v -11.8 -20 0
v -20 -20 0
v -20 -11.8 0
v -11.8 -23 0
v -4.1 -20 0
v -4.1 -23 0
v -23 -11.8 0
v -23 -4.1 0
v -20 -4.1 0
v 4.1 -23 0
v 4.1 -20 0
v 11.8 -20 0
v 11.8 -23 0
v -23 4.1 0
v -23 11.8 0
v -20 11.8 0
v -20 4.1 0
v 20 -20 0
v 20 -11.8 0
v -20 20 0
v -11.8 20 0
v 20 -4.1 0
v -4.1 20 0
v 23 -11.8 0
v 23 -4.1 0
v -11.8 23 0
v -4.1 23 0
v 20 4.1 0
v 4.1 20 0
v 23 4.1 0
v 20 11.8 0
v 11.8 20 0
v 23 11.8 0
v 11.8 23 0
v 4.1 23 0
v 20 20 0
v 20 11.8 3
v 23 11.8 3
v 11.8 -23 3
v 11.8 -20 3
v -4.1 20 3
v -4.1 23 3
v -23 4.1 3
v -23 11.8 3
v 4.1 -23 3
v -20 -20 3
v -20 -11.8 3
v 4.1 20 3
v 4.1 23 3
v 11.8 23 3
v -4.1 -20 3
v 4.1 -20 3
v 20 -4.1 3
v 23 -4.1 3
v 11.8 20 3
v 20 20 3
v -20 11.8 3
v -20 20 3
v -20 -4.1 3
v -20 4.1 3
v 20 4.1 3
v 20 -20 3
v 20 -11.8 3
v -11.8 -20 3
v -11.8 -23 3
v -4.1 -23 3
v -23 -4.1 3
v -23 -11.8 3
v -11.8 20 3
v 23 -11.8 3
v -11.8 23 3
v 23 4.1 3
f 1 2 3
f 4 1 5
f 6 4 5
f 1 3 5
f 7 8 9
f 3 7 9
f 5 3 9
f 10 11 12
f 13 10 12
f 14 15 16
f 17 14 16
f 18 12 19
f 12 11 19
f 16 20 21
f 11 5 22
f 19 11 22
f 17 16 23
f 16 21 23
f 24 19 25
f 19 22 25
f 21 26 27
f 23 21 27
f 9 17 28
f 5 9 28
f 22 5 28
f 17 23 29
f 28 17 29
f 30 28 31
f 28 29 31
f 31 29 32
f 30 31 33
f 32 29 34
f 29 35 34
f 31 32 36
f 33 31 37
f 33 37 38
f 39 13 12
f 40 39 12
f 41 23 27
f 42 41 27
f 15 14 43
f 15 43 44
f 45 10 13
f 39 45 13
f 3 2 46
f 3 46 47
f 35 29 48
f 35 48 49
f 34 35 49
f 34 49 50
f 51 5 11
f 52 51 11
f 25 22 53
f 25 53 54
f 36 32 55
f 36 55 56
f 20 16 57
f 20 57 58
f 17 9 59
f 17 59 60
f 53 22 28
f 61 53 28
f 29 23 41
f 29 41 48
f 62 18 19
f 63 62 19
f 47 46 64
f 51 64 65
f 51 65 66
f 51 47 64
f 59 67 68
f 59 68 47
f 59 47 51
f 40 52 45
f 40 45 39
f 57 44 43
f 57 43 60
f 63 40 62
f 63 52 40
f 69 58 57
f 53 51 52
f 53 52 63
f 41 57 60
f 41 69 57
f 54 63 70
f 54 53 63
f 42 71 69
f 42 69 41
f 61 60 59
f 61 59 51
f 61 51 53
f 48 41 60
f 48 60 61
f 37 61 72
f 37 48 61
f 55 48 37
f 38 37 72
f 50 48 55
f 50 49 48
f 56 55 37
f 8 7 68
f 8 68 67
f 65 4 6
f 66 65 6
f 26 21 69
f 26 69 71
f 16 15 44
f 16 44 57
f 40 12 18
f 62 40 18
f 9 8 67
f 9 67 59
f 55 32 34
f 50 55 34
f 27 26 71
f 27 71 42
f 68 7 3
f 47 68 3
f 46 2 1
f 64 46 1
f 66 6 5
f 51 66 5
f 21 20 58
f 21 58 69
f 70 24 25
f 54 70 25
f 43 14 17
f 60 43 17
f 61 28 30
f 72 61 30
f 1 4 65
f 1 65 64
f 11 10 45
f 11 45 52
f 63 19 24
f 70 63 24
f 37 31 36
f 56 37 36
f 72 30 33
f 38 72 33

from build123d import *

# Parameters (mm, degrees)
CROQUIS1_W              = 3
CROQUIS1_H              = 7.7
CROQUIS1_W_2            = 7.7
CROQUIS1_H_2            = 3
CROQUIS1_W_3            = 40
CROQUIS1_H_3            = 40
SALIENTE_EXTRUIR1_DEPTH = 3


with BuildPart() as part:
    # Croquis1 → Saliente-Extruir1 (new body)
    with BuildSketch(Plane.XY):
        with Locations((-21.5, -7.95)):
            Rectangle(CROQUIS1_W, CROQUIS1_H)
        with Locations((-7.95, -21.5)):
            Rectangle(CROQUIS1_W_2, CROQUIS1_H_2)
        with Locations((7.95, -21.5)):
            Rectangle(CROQUIS1_W_2, CROQUIS1_H_2)
        with Locations((21.5, -7.95)):
            Rectangle(CROQUIS1_W, CROQUIS1_H)
        with Locations((21.5, 7.95)):
            Rectangle(CROQUIS1_W, CROQUIS1_H)
        with Locations((-21.5, 7.95)):
            Rectangle(CROQUIS1_W, CROQUIS1_H)
        with Locations((-7.95, 21.5)):
            Rectangle(CROQUIS1_W_2, CROQUIS1_H_2)
        with Locations((7.95, 21.5)):
            Rectangle(CROQUIS1_W_2, CROQUIS1_H_2)
        Rectangle(CROQUIS1_W_3, CROQUIS1_H_3)
    extrude(amount=SALIENTE_EXTRUIR1_DEPTH)


solid = part.part
